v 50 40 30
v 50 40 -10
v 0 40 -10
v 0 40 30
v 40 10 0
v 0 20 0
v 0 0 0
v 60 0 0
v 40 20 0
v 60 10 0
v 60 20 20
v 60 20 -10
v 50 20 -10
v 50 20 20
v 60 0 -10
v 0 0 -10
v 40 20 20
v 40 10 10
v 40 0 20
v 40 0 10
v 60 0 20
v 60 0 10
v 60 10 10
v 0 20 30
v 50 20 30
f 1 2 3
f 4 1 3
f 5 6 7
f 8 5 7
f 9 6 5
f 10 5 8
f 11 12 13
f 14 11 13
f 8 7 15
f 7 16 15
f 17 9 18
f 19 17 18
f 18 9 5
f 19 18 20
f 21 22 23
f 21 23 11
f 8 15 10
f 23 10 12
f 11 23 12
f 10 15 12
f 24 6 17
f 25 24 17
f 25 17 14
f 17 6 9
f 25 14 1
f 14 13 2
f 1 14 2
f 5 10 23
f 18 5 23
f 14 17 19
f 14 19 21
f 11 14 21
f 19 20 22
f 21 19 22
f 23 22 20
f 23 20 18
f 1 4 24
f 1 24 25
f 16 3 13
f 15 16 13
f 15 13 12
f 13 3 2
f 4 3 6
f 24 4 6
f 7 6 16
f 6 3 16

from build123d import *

# Parameters (mm, degrees)
F0_W     = 40
F0_H     = 20
F1_DEPTH = 10
F2_DEPTH = 30
F3_DEPTH = 20
F4_W     = 10
F4_H     = 10
F5_DEPTH = 25


with BuildPart() as f1:
    # F0 (on Top) → F1 (new body)
    with BuildSketch(Plane.XY):
        Polygon((0, 40), (0, 20), (40, 20), (50, 20), (50, 40), align=None)
        with Locations((20, 10)):
            Rectangle(F0_W, F0_H)
        Polygon((40, 20), (40, 0), (60, 0), (60, 20), (50, 20), align=None)
    extrude(amount=-F1_DEPTH)

    # F0 (on Top) → F2 (join)
    with BuildSketch(Plane.XY):
        Polygon((0, 40), (0, 20), (40, 20), (50, 20), (50, 40), align=None)
    extrude(amount=F2_DEPTH)

    # F0 (on Top) → F3 (join)
    with BuildSketch(Plane.XY):
        Polygon((40, 20), (40, 0), (60, 0), (60, 20), (50, 20), align=None)
    extrude(amount=F3_DEPTH)

    # F4 (on face) → F5 (cut)
    with BuildSketch(Plane.YZ.offset(60)):
        with Locations((5, 5)):
            Rectangle(F4_W, F4_H)
    extrude(amount=-F5_DEPTH, mode=Mode.SUBTRACT)


solid = f1.part
